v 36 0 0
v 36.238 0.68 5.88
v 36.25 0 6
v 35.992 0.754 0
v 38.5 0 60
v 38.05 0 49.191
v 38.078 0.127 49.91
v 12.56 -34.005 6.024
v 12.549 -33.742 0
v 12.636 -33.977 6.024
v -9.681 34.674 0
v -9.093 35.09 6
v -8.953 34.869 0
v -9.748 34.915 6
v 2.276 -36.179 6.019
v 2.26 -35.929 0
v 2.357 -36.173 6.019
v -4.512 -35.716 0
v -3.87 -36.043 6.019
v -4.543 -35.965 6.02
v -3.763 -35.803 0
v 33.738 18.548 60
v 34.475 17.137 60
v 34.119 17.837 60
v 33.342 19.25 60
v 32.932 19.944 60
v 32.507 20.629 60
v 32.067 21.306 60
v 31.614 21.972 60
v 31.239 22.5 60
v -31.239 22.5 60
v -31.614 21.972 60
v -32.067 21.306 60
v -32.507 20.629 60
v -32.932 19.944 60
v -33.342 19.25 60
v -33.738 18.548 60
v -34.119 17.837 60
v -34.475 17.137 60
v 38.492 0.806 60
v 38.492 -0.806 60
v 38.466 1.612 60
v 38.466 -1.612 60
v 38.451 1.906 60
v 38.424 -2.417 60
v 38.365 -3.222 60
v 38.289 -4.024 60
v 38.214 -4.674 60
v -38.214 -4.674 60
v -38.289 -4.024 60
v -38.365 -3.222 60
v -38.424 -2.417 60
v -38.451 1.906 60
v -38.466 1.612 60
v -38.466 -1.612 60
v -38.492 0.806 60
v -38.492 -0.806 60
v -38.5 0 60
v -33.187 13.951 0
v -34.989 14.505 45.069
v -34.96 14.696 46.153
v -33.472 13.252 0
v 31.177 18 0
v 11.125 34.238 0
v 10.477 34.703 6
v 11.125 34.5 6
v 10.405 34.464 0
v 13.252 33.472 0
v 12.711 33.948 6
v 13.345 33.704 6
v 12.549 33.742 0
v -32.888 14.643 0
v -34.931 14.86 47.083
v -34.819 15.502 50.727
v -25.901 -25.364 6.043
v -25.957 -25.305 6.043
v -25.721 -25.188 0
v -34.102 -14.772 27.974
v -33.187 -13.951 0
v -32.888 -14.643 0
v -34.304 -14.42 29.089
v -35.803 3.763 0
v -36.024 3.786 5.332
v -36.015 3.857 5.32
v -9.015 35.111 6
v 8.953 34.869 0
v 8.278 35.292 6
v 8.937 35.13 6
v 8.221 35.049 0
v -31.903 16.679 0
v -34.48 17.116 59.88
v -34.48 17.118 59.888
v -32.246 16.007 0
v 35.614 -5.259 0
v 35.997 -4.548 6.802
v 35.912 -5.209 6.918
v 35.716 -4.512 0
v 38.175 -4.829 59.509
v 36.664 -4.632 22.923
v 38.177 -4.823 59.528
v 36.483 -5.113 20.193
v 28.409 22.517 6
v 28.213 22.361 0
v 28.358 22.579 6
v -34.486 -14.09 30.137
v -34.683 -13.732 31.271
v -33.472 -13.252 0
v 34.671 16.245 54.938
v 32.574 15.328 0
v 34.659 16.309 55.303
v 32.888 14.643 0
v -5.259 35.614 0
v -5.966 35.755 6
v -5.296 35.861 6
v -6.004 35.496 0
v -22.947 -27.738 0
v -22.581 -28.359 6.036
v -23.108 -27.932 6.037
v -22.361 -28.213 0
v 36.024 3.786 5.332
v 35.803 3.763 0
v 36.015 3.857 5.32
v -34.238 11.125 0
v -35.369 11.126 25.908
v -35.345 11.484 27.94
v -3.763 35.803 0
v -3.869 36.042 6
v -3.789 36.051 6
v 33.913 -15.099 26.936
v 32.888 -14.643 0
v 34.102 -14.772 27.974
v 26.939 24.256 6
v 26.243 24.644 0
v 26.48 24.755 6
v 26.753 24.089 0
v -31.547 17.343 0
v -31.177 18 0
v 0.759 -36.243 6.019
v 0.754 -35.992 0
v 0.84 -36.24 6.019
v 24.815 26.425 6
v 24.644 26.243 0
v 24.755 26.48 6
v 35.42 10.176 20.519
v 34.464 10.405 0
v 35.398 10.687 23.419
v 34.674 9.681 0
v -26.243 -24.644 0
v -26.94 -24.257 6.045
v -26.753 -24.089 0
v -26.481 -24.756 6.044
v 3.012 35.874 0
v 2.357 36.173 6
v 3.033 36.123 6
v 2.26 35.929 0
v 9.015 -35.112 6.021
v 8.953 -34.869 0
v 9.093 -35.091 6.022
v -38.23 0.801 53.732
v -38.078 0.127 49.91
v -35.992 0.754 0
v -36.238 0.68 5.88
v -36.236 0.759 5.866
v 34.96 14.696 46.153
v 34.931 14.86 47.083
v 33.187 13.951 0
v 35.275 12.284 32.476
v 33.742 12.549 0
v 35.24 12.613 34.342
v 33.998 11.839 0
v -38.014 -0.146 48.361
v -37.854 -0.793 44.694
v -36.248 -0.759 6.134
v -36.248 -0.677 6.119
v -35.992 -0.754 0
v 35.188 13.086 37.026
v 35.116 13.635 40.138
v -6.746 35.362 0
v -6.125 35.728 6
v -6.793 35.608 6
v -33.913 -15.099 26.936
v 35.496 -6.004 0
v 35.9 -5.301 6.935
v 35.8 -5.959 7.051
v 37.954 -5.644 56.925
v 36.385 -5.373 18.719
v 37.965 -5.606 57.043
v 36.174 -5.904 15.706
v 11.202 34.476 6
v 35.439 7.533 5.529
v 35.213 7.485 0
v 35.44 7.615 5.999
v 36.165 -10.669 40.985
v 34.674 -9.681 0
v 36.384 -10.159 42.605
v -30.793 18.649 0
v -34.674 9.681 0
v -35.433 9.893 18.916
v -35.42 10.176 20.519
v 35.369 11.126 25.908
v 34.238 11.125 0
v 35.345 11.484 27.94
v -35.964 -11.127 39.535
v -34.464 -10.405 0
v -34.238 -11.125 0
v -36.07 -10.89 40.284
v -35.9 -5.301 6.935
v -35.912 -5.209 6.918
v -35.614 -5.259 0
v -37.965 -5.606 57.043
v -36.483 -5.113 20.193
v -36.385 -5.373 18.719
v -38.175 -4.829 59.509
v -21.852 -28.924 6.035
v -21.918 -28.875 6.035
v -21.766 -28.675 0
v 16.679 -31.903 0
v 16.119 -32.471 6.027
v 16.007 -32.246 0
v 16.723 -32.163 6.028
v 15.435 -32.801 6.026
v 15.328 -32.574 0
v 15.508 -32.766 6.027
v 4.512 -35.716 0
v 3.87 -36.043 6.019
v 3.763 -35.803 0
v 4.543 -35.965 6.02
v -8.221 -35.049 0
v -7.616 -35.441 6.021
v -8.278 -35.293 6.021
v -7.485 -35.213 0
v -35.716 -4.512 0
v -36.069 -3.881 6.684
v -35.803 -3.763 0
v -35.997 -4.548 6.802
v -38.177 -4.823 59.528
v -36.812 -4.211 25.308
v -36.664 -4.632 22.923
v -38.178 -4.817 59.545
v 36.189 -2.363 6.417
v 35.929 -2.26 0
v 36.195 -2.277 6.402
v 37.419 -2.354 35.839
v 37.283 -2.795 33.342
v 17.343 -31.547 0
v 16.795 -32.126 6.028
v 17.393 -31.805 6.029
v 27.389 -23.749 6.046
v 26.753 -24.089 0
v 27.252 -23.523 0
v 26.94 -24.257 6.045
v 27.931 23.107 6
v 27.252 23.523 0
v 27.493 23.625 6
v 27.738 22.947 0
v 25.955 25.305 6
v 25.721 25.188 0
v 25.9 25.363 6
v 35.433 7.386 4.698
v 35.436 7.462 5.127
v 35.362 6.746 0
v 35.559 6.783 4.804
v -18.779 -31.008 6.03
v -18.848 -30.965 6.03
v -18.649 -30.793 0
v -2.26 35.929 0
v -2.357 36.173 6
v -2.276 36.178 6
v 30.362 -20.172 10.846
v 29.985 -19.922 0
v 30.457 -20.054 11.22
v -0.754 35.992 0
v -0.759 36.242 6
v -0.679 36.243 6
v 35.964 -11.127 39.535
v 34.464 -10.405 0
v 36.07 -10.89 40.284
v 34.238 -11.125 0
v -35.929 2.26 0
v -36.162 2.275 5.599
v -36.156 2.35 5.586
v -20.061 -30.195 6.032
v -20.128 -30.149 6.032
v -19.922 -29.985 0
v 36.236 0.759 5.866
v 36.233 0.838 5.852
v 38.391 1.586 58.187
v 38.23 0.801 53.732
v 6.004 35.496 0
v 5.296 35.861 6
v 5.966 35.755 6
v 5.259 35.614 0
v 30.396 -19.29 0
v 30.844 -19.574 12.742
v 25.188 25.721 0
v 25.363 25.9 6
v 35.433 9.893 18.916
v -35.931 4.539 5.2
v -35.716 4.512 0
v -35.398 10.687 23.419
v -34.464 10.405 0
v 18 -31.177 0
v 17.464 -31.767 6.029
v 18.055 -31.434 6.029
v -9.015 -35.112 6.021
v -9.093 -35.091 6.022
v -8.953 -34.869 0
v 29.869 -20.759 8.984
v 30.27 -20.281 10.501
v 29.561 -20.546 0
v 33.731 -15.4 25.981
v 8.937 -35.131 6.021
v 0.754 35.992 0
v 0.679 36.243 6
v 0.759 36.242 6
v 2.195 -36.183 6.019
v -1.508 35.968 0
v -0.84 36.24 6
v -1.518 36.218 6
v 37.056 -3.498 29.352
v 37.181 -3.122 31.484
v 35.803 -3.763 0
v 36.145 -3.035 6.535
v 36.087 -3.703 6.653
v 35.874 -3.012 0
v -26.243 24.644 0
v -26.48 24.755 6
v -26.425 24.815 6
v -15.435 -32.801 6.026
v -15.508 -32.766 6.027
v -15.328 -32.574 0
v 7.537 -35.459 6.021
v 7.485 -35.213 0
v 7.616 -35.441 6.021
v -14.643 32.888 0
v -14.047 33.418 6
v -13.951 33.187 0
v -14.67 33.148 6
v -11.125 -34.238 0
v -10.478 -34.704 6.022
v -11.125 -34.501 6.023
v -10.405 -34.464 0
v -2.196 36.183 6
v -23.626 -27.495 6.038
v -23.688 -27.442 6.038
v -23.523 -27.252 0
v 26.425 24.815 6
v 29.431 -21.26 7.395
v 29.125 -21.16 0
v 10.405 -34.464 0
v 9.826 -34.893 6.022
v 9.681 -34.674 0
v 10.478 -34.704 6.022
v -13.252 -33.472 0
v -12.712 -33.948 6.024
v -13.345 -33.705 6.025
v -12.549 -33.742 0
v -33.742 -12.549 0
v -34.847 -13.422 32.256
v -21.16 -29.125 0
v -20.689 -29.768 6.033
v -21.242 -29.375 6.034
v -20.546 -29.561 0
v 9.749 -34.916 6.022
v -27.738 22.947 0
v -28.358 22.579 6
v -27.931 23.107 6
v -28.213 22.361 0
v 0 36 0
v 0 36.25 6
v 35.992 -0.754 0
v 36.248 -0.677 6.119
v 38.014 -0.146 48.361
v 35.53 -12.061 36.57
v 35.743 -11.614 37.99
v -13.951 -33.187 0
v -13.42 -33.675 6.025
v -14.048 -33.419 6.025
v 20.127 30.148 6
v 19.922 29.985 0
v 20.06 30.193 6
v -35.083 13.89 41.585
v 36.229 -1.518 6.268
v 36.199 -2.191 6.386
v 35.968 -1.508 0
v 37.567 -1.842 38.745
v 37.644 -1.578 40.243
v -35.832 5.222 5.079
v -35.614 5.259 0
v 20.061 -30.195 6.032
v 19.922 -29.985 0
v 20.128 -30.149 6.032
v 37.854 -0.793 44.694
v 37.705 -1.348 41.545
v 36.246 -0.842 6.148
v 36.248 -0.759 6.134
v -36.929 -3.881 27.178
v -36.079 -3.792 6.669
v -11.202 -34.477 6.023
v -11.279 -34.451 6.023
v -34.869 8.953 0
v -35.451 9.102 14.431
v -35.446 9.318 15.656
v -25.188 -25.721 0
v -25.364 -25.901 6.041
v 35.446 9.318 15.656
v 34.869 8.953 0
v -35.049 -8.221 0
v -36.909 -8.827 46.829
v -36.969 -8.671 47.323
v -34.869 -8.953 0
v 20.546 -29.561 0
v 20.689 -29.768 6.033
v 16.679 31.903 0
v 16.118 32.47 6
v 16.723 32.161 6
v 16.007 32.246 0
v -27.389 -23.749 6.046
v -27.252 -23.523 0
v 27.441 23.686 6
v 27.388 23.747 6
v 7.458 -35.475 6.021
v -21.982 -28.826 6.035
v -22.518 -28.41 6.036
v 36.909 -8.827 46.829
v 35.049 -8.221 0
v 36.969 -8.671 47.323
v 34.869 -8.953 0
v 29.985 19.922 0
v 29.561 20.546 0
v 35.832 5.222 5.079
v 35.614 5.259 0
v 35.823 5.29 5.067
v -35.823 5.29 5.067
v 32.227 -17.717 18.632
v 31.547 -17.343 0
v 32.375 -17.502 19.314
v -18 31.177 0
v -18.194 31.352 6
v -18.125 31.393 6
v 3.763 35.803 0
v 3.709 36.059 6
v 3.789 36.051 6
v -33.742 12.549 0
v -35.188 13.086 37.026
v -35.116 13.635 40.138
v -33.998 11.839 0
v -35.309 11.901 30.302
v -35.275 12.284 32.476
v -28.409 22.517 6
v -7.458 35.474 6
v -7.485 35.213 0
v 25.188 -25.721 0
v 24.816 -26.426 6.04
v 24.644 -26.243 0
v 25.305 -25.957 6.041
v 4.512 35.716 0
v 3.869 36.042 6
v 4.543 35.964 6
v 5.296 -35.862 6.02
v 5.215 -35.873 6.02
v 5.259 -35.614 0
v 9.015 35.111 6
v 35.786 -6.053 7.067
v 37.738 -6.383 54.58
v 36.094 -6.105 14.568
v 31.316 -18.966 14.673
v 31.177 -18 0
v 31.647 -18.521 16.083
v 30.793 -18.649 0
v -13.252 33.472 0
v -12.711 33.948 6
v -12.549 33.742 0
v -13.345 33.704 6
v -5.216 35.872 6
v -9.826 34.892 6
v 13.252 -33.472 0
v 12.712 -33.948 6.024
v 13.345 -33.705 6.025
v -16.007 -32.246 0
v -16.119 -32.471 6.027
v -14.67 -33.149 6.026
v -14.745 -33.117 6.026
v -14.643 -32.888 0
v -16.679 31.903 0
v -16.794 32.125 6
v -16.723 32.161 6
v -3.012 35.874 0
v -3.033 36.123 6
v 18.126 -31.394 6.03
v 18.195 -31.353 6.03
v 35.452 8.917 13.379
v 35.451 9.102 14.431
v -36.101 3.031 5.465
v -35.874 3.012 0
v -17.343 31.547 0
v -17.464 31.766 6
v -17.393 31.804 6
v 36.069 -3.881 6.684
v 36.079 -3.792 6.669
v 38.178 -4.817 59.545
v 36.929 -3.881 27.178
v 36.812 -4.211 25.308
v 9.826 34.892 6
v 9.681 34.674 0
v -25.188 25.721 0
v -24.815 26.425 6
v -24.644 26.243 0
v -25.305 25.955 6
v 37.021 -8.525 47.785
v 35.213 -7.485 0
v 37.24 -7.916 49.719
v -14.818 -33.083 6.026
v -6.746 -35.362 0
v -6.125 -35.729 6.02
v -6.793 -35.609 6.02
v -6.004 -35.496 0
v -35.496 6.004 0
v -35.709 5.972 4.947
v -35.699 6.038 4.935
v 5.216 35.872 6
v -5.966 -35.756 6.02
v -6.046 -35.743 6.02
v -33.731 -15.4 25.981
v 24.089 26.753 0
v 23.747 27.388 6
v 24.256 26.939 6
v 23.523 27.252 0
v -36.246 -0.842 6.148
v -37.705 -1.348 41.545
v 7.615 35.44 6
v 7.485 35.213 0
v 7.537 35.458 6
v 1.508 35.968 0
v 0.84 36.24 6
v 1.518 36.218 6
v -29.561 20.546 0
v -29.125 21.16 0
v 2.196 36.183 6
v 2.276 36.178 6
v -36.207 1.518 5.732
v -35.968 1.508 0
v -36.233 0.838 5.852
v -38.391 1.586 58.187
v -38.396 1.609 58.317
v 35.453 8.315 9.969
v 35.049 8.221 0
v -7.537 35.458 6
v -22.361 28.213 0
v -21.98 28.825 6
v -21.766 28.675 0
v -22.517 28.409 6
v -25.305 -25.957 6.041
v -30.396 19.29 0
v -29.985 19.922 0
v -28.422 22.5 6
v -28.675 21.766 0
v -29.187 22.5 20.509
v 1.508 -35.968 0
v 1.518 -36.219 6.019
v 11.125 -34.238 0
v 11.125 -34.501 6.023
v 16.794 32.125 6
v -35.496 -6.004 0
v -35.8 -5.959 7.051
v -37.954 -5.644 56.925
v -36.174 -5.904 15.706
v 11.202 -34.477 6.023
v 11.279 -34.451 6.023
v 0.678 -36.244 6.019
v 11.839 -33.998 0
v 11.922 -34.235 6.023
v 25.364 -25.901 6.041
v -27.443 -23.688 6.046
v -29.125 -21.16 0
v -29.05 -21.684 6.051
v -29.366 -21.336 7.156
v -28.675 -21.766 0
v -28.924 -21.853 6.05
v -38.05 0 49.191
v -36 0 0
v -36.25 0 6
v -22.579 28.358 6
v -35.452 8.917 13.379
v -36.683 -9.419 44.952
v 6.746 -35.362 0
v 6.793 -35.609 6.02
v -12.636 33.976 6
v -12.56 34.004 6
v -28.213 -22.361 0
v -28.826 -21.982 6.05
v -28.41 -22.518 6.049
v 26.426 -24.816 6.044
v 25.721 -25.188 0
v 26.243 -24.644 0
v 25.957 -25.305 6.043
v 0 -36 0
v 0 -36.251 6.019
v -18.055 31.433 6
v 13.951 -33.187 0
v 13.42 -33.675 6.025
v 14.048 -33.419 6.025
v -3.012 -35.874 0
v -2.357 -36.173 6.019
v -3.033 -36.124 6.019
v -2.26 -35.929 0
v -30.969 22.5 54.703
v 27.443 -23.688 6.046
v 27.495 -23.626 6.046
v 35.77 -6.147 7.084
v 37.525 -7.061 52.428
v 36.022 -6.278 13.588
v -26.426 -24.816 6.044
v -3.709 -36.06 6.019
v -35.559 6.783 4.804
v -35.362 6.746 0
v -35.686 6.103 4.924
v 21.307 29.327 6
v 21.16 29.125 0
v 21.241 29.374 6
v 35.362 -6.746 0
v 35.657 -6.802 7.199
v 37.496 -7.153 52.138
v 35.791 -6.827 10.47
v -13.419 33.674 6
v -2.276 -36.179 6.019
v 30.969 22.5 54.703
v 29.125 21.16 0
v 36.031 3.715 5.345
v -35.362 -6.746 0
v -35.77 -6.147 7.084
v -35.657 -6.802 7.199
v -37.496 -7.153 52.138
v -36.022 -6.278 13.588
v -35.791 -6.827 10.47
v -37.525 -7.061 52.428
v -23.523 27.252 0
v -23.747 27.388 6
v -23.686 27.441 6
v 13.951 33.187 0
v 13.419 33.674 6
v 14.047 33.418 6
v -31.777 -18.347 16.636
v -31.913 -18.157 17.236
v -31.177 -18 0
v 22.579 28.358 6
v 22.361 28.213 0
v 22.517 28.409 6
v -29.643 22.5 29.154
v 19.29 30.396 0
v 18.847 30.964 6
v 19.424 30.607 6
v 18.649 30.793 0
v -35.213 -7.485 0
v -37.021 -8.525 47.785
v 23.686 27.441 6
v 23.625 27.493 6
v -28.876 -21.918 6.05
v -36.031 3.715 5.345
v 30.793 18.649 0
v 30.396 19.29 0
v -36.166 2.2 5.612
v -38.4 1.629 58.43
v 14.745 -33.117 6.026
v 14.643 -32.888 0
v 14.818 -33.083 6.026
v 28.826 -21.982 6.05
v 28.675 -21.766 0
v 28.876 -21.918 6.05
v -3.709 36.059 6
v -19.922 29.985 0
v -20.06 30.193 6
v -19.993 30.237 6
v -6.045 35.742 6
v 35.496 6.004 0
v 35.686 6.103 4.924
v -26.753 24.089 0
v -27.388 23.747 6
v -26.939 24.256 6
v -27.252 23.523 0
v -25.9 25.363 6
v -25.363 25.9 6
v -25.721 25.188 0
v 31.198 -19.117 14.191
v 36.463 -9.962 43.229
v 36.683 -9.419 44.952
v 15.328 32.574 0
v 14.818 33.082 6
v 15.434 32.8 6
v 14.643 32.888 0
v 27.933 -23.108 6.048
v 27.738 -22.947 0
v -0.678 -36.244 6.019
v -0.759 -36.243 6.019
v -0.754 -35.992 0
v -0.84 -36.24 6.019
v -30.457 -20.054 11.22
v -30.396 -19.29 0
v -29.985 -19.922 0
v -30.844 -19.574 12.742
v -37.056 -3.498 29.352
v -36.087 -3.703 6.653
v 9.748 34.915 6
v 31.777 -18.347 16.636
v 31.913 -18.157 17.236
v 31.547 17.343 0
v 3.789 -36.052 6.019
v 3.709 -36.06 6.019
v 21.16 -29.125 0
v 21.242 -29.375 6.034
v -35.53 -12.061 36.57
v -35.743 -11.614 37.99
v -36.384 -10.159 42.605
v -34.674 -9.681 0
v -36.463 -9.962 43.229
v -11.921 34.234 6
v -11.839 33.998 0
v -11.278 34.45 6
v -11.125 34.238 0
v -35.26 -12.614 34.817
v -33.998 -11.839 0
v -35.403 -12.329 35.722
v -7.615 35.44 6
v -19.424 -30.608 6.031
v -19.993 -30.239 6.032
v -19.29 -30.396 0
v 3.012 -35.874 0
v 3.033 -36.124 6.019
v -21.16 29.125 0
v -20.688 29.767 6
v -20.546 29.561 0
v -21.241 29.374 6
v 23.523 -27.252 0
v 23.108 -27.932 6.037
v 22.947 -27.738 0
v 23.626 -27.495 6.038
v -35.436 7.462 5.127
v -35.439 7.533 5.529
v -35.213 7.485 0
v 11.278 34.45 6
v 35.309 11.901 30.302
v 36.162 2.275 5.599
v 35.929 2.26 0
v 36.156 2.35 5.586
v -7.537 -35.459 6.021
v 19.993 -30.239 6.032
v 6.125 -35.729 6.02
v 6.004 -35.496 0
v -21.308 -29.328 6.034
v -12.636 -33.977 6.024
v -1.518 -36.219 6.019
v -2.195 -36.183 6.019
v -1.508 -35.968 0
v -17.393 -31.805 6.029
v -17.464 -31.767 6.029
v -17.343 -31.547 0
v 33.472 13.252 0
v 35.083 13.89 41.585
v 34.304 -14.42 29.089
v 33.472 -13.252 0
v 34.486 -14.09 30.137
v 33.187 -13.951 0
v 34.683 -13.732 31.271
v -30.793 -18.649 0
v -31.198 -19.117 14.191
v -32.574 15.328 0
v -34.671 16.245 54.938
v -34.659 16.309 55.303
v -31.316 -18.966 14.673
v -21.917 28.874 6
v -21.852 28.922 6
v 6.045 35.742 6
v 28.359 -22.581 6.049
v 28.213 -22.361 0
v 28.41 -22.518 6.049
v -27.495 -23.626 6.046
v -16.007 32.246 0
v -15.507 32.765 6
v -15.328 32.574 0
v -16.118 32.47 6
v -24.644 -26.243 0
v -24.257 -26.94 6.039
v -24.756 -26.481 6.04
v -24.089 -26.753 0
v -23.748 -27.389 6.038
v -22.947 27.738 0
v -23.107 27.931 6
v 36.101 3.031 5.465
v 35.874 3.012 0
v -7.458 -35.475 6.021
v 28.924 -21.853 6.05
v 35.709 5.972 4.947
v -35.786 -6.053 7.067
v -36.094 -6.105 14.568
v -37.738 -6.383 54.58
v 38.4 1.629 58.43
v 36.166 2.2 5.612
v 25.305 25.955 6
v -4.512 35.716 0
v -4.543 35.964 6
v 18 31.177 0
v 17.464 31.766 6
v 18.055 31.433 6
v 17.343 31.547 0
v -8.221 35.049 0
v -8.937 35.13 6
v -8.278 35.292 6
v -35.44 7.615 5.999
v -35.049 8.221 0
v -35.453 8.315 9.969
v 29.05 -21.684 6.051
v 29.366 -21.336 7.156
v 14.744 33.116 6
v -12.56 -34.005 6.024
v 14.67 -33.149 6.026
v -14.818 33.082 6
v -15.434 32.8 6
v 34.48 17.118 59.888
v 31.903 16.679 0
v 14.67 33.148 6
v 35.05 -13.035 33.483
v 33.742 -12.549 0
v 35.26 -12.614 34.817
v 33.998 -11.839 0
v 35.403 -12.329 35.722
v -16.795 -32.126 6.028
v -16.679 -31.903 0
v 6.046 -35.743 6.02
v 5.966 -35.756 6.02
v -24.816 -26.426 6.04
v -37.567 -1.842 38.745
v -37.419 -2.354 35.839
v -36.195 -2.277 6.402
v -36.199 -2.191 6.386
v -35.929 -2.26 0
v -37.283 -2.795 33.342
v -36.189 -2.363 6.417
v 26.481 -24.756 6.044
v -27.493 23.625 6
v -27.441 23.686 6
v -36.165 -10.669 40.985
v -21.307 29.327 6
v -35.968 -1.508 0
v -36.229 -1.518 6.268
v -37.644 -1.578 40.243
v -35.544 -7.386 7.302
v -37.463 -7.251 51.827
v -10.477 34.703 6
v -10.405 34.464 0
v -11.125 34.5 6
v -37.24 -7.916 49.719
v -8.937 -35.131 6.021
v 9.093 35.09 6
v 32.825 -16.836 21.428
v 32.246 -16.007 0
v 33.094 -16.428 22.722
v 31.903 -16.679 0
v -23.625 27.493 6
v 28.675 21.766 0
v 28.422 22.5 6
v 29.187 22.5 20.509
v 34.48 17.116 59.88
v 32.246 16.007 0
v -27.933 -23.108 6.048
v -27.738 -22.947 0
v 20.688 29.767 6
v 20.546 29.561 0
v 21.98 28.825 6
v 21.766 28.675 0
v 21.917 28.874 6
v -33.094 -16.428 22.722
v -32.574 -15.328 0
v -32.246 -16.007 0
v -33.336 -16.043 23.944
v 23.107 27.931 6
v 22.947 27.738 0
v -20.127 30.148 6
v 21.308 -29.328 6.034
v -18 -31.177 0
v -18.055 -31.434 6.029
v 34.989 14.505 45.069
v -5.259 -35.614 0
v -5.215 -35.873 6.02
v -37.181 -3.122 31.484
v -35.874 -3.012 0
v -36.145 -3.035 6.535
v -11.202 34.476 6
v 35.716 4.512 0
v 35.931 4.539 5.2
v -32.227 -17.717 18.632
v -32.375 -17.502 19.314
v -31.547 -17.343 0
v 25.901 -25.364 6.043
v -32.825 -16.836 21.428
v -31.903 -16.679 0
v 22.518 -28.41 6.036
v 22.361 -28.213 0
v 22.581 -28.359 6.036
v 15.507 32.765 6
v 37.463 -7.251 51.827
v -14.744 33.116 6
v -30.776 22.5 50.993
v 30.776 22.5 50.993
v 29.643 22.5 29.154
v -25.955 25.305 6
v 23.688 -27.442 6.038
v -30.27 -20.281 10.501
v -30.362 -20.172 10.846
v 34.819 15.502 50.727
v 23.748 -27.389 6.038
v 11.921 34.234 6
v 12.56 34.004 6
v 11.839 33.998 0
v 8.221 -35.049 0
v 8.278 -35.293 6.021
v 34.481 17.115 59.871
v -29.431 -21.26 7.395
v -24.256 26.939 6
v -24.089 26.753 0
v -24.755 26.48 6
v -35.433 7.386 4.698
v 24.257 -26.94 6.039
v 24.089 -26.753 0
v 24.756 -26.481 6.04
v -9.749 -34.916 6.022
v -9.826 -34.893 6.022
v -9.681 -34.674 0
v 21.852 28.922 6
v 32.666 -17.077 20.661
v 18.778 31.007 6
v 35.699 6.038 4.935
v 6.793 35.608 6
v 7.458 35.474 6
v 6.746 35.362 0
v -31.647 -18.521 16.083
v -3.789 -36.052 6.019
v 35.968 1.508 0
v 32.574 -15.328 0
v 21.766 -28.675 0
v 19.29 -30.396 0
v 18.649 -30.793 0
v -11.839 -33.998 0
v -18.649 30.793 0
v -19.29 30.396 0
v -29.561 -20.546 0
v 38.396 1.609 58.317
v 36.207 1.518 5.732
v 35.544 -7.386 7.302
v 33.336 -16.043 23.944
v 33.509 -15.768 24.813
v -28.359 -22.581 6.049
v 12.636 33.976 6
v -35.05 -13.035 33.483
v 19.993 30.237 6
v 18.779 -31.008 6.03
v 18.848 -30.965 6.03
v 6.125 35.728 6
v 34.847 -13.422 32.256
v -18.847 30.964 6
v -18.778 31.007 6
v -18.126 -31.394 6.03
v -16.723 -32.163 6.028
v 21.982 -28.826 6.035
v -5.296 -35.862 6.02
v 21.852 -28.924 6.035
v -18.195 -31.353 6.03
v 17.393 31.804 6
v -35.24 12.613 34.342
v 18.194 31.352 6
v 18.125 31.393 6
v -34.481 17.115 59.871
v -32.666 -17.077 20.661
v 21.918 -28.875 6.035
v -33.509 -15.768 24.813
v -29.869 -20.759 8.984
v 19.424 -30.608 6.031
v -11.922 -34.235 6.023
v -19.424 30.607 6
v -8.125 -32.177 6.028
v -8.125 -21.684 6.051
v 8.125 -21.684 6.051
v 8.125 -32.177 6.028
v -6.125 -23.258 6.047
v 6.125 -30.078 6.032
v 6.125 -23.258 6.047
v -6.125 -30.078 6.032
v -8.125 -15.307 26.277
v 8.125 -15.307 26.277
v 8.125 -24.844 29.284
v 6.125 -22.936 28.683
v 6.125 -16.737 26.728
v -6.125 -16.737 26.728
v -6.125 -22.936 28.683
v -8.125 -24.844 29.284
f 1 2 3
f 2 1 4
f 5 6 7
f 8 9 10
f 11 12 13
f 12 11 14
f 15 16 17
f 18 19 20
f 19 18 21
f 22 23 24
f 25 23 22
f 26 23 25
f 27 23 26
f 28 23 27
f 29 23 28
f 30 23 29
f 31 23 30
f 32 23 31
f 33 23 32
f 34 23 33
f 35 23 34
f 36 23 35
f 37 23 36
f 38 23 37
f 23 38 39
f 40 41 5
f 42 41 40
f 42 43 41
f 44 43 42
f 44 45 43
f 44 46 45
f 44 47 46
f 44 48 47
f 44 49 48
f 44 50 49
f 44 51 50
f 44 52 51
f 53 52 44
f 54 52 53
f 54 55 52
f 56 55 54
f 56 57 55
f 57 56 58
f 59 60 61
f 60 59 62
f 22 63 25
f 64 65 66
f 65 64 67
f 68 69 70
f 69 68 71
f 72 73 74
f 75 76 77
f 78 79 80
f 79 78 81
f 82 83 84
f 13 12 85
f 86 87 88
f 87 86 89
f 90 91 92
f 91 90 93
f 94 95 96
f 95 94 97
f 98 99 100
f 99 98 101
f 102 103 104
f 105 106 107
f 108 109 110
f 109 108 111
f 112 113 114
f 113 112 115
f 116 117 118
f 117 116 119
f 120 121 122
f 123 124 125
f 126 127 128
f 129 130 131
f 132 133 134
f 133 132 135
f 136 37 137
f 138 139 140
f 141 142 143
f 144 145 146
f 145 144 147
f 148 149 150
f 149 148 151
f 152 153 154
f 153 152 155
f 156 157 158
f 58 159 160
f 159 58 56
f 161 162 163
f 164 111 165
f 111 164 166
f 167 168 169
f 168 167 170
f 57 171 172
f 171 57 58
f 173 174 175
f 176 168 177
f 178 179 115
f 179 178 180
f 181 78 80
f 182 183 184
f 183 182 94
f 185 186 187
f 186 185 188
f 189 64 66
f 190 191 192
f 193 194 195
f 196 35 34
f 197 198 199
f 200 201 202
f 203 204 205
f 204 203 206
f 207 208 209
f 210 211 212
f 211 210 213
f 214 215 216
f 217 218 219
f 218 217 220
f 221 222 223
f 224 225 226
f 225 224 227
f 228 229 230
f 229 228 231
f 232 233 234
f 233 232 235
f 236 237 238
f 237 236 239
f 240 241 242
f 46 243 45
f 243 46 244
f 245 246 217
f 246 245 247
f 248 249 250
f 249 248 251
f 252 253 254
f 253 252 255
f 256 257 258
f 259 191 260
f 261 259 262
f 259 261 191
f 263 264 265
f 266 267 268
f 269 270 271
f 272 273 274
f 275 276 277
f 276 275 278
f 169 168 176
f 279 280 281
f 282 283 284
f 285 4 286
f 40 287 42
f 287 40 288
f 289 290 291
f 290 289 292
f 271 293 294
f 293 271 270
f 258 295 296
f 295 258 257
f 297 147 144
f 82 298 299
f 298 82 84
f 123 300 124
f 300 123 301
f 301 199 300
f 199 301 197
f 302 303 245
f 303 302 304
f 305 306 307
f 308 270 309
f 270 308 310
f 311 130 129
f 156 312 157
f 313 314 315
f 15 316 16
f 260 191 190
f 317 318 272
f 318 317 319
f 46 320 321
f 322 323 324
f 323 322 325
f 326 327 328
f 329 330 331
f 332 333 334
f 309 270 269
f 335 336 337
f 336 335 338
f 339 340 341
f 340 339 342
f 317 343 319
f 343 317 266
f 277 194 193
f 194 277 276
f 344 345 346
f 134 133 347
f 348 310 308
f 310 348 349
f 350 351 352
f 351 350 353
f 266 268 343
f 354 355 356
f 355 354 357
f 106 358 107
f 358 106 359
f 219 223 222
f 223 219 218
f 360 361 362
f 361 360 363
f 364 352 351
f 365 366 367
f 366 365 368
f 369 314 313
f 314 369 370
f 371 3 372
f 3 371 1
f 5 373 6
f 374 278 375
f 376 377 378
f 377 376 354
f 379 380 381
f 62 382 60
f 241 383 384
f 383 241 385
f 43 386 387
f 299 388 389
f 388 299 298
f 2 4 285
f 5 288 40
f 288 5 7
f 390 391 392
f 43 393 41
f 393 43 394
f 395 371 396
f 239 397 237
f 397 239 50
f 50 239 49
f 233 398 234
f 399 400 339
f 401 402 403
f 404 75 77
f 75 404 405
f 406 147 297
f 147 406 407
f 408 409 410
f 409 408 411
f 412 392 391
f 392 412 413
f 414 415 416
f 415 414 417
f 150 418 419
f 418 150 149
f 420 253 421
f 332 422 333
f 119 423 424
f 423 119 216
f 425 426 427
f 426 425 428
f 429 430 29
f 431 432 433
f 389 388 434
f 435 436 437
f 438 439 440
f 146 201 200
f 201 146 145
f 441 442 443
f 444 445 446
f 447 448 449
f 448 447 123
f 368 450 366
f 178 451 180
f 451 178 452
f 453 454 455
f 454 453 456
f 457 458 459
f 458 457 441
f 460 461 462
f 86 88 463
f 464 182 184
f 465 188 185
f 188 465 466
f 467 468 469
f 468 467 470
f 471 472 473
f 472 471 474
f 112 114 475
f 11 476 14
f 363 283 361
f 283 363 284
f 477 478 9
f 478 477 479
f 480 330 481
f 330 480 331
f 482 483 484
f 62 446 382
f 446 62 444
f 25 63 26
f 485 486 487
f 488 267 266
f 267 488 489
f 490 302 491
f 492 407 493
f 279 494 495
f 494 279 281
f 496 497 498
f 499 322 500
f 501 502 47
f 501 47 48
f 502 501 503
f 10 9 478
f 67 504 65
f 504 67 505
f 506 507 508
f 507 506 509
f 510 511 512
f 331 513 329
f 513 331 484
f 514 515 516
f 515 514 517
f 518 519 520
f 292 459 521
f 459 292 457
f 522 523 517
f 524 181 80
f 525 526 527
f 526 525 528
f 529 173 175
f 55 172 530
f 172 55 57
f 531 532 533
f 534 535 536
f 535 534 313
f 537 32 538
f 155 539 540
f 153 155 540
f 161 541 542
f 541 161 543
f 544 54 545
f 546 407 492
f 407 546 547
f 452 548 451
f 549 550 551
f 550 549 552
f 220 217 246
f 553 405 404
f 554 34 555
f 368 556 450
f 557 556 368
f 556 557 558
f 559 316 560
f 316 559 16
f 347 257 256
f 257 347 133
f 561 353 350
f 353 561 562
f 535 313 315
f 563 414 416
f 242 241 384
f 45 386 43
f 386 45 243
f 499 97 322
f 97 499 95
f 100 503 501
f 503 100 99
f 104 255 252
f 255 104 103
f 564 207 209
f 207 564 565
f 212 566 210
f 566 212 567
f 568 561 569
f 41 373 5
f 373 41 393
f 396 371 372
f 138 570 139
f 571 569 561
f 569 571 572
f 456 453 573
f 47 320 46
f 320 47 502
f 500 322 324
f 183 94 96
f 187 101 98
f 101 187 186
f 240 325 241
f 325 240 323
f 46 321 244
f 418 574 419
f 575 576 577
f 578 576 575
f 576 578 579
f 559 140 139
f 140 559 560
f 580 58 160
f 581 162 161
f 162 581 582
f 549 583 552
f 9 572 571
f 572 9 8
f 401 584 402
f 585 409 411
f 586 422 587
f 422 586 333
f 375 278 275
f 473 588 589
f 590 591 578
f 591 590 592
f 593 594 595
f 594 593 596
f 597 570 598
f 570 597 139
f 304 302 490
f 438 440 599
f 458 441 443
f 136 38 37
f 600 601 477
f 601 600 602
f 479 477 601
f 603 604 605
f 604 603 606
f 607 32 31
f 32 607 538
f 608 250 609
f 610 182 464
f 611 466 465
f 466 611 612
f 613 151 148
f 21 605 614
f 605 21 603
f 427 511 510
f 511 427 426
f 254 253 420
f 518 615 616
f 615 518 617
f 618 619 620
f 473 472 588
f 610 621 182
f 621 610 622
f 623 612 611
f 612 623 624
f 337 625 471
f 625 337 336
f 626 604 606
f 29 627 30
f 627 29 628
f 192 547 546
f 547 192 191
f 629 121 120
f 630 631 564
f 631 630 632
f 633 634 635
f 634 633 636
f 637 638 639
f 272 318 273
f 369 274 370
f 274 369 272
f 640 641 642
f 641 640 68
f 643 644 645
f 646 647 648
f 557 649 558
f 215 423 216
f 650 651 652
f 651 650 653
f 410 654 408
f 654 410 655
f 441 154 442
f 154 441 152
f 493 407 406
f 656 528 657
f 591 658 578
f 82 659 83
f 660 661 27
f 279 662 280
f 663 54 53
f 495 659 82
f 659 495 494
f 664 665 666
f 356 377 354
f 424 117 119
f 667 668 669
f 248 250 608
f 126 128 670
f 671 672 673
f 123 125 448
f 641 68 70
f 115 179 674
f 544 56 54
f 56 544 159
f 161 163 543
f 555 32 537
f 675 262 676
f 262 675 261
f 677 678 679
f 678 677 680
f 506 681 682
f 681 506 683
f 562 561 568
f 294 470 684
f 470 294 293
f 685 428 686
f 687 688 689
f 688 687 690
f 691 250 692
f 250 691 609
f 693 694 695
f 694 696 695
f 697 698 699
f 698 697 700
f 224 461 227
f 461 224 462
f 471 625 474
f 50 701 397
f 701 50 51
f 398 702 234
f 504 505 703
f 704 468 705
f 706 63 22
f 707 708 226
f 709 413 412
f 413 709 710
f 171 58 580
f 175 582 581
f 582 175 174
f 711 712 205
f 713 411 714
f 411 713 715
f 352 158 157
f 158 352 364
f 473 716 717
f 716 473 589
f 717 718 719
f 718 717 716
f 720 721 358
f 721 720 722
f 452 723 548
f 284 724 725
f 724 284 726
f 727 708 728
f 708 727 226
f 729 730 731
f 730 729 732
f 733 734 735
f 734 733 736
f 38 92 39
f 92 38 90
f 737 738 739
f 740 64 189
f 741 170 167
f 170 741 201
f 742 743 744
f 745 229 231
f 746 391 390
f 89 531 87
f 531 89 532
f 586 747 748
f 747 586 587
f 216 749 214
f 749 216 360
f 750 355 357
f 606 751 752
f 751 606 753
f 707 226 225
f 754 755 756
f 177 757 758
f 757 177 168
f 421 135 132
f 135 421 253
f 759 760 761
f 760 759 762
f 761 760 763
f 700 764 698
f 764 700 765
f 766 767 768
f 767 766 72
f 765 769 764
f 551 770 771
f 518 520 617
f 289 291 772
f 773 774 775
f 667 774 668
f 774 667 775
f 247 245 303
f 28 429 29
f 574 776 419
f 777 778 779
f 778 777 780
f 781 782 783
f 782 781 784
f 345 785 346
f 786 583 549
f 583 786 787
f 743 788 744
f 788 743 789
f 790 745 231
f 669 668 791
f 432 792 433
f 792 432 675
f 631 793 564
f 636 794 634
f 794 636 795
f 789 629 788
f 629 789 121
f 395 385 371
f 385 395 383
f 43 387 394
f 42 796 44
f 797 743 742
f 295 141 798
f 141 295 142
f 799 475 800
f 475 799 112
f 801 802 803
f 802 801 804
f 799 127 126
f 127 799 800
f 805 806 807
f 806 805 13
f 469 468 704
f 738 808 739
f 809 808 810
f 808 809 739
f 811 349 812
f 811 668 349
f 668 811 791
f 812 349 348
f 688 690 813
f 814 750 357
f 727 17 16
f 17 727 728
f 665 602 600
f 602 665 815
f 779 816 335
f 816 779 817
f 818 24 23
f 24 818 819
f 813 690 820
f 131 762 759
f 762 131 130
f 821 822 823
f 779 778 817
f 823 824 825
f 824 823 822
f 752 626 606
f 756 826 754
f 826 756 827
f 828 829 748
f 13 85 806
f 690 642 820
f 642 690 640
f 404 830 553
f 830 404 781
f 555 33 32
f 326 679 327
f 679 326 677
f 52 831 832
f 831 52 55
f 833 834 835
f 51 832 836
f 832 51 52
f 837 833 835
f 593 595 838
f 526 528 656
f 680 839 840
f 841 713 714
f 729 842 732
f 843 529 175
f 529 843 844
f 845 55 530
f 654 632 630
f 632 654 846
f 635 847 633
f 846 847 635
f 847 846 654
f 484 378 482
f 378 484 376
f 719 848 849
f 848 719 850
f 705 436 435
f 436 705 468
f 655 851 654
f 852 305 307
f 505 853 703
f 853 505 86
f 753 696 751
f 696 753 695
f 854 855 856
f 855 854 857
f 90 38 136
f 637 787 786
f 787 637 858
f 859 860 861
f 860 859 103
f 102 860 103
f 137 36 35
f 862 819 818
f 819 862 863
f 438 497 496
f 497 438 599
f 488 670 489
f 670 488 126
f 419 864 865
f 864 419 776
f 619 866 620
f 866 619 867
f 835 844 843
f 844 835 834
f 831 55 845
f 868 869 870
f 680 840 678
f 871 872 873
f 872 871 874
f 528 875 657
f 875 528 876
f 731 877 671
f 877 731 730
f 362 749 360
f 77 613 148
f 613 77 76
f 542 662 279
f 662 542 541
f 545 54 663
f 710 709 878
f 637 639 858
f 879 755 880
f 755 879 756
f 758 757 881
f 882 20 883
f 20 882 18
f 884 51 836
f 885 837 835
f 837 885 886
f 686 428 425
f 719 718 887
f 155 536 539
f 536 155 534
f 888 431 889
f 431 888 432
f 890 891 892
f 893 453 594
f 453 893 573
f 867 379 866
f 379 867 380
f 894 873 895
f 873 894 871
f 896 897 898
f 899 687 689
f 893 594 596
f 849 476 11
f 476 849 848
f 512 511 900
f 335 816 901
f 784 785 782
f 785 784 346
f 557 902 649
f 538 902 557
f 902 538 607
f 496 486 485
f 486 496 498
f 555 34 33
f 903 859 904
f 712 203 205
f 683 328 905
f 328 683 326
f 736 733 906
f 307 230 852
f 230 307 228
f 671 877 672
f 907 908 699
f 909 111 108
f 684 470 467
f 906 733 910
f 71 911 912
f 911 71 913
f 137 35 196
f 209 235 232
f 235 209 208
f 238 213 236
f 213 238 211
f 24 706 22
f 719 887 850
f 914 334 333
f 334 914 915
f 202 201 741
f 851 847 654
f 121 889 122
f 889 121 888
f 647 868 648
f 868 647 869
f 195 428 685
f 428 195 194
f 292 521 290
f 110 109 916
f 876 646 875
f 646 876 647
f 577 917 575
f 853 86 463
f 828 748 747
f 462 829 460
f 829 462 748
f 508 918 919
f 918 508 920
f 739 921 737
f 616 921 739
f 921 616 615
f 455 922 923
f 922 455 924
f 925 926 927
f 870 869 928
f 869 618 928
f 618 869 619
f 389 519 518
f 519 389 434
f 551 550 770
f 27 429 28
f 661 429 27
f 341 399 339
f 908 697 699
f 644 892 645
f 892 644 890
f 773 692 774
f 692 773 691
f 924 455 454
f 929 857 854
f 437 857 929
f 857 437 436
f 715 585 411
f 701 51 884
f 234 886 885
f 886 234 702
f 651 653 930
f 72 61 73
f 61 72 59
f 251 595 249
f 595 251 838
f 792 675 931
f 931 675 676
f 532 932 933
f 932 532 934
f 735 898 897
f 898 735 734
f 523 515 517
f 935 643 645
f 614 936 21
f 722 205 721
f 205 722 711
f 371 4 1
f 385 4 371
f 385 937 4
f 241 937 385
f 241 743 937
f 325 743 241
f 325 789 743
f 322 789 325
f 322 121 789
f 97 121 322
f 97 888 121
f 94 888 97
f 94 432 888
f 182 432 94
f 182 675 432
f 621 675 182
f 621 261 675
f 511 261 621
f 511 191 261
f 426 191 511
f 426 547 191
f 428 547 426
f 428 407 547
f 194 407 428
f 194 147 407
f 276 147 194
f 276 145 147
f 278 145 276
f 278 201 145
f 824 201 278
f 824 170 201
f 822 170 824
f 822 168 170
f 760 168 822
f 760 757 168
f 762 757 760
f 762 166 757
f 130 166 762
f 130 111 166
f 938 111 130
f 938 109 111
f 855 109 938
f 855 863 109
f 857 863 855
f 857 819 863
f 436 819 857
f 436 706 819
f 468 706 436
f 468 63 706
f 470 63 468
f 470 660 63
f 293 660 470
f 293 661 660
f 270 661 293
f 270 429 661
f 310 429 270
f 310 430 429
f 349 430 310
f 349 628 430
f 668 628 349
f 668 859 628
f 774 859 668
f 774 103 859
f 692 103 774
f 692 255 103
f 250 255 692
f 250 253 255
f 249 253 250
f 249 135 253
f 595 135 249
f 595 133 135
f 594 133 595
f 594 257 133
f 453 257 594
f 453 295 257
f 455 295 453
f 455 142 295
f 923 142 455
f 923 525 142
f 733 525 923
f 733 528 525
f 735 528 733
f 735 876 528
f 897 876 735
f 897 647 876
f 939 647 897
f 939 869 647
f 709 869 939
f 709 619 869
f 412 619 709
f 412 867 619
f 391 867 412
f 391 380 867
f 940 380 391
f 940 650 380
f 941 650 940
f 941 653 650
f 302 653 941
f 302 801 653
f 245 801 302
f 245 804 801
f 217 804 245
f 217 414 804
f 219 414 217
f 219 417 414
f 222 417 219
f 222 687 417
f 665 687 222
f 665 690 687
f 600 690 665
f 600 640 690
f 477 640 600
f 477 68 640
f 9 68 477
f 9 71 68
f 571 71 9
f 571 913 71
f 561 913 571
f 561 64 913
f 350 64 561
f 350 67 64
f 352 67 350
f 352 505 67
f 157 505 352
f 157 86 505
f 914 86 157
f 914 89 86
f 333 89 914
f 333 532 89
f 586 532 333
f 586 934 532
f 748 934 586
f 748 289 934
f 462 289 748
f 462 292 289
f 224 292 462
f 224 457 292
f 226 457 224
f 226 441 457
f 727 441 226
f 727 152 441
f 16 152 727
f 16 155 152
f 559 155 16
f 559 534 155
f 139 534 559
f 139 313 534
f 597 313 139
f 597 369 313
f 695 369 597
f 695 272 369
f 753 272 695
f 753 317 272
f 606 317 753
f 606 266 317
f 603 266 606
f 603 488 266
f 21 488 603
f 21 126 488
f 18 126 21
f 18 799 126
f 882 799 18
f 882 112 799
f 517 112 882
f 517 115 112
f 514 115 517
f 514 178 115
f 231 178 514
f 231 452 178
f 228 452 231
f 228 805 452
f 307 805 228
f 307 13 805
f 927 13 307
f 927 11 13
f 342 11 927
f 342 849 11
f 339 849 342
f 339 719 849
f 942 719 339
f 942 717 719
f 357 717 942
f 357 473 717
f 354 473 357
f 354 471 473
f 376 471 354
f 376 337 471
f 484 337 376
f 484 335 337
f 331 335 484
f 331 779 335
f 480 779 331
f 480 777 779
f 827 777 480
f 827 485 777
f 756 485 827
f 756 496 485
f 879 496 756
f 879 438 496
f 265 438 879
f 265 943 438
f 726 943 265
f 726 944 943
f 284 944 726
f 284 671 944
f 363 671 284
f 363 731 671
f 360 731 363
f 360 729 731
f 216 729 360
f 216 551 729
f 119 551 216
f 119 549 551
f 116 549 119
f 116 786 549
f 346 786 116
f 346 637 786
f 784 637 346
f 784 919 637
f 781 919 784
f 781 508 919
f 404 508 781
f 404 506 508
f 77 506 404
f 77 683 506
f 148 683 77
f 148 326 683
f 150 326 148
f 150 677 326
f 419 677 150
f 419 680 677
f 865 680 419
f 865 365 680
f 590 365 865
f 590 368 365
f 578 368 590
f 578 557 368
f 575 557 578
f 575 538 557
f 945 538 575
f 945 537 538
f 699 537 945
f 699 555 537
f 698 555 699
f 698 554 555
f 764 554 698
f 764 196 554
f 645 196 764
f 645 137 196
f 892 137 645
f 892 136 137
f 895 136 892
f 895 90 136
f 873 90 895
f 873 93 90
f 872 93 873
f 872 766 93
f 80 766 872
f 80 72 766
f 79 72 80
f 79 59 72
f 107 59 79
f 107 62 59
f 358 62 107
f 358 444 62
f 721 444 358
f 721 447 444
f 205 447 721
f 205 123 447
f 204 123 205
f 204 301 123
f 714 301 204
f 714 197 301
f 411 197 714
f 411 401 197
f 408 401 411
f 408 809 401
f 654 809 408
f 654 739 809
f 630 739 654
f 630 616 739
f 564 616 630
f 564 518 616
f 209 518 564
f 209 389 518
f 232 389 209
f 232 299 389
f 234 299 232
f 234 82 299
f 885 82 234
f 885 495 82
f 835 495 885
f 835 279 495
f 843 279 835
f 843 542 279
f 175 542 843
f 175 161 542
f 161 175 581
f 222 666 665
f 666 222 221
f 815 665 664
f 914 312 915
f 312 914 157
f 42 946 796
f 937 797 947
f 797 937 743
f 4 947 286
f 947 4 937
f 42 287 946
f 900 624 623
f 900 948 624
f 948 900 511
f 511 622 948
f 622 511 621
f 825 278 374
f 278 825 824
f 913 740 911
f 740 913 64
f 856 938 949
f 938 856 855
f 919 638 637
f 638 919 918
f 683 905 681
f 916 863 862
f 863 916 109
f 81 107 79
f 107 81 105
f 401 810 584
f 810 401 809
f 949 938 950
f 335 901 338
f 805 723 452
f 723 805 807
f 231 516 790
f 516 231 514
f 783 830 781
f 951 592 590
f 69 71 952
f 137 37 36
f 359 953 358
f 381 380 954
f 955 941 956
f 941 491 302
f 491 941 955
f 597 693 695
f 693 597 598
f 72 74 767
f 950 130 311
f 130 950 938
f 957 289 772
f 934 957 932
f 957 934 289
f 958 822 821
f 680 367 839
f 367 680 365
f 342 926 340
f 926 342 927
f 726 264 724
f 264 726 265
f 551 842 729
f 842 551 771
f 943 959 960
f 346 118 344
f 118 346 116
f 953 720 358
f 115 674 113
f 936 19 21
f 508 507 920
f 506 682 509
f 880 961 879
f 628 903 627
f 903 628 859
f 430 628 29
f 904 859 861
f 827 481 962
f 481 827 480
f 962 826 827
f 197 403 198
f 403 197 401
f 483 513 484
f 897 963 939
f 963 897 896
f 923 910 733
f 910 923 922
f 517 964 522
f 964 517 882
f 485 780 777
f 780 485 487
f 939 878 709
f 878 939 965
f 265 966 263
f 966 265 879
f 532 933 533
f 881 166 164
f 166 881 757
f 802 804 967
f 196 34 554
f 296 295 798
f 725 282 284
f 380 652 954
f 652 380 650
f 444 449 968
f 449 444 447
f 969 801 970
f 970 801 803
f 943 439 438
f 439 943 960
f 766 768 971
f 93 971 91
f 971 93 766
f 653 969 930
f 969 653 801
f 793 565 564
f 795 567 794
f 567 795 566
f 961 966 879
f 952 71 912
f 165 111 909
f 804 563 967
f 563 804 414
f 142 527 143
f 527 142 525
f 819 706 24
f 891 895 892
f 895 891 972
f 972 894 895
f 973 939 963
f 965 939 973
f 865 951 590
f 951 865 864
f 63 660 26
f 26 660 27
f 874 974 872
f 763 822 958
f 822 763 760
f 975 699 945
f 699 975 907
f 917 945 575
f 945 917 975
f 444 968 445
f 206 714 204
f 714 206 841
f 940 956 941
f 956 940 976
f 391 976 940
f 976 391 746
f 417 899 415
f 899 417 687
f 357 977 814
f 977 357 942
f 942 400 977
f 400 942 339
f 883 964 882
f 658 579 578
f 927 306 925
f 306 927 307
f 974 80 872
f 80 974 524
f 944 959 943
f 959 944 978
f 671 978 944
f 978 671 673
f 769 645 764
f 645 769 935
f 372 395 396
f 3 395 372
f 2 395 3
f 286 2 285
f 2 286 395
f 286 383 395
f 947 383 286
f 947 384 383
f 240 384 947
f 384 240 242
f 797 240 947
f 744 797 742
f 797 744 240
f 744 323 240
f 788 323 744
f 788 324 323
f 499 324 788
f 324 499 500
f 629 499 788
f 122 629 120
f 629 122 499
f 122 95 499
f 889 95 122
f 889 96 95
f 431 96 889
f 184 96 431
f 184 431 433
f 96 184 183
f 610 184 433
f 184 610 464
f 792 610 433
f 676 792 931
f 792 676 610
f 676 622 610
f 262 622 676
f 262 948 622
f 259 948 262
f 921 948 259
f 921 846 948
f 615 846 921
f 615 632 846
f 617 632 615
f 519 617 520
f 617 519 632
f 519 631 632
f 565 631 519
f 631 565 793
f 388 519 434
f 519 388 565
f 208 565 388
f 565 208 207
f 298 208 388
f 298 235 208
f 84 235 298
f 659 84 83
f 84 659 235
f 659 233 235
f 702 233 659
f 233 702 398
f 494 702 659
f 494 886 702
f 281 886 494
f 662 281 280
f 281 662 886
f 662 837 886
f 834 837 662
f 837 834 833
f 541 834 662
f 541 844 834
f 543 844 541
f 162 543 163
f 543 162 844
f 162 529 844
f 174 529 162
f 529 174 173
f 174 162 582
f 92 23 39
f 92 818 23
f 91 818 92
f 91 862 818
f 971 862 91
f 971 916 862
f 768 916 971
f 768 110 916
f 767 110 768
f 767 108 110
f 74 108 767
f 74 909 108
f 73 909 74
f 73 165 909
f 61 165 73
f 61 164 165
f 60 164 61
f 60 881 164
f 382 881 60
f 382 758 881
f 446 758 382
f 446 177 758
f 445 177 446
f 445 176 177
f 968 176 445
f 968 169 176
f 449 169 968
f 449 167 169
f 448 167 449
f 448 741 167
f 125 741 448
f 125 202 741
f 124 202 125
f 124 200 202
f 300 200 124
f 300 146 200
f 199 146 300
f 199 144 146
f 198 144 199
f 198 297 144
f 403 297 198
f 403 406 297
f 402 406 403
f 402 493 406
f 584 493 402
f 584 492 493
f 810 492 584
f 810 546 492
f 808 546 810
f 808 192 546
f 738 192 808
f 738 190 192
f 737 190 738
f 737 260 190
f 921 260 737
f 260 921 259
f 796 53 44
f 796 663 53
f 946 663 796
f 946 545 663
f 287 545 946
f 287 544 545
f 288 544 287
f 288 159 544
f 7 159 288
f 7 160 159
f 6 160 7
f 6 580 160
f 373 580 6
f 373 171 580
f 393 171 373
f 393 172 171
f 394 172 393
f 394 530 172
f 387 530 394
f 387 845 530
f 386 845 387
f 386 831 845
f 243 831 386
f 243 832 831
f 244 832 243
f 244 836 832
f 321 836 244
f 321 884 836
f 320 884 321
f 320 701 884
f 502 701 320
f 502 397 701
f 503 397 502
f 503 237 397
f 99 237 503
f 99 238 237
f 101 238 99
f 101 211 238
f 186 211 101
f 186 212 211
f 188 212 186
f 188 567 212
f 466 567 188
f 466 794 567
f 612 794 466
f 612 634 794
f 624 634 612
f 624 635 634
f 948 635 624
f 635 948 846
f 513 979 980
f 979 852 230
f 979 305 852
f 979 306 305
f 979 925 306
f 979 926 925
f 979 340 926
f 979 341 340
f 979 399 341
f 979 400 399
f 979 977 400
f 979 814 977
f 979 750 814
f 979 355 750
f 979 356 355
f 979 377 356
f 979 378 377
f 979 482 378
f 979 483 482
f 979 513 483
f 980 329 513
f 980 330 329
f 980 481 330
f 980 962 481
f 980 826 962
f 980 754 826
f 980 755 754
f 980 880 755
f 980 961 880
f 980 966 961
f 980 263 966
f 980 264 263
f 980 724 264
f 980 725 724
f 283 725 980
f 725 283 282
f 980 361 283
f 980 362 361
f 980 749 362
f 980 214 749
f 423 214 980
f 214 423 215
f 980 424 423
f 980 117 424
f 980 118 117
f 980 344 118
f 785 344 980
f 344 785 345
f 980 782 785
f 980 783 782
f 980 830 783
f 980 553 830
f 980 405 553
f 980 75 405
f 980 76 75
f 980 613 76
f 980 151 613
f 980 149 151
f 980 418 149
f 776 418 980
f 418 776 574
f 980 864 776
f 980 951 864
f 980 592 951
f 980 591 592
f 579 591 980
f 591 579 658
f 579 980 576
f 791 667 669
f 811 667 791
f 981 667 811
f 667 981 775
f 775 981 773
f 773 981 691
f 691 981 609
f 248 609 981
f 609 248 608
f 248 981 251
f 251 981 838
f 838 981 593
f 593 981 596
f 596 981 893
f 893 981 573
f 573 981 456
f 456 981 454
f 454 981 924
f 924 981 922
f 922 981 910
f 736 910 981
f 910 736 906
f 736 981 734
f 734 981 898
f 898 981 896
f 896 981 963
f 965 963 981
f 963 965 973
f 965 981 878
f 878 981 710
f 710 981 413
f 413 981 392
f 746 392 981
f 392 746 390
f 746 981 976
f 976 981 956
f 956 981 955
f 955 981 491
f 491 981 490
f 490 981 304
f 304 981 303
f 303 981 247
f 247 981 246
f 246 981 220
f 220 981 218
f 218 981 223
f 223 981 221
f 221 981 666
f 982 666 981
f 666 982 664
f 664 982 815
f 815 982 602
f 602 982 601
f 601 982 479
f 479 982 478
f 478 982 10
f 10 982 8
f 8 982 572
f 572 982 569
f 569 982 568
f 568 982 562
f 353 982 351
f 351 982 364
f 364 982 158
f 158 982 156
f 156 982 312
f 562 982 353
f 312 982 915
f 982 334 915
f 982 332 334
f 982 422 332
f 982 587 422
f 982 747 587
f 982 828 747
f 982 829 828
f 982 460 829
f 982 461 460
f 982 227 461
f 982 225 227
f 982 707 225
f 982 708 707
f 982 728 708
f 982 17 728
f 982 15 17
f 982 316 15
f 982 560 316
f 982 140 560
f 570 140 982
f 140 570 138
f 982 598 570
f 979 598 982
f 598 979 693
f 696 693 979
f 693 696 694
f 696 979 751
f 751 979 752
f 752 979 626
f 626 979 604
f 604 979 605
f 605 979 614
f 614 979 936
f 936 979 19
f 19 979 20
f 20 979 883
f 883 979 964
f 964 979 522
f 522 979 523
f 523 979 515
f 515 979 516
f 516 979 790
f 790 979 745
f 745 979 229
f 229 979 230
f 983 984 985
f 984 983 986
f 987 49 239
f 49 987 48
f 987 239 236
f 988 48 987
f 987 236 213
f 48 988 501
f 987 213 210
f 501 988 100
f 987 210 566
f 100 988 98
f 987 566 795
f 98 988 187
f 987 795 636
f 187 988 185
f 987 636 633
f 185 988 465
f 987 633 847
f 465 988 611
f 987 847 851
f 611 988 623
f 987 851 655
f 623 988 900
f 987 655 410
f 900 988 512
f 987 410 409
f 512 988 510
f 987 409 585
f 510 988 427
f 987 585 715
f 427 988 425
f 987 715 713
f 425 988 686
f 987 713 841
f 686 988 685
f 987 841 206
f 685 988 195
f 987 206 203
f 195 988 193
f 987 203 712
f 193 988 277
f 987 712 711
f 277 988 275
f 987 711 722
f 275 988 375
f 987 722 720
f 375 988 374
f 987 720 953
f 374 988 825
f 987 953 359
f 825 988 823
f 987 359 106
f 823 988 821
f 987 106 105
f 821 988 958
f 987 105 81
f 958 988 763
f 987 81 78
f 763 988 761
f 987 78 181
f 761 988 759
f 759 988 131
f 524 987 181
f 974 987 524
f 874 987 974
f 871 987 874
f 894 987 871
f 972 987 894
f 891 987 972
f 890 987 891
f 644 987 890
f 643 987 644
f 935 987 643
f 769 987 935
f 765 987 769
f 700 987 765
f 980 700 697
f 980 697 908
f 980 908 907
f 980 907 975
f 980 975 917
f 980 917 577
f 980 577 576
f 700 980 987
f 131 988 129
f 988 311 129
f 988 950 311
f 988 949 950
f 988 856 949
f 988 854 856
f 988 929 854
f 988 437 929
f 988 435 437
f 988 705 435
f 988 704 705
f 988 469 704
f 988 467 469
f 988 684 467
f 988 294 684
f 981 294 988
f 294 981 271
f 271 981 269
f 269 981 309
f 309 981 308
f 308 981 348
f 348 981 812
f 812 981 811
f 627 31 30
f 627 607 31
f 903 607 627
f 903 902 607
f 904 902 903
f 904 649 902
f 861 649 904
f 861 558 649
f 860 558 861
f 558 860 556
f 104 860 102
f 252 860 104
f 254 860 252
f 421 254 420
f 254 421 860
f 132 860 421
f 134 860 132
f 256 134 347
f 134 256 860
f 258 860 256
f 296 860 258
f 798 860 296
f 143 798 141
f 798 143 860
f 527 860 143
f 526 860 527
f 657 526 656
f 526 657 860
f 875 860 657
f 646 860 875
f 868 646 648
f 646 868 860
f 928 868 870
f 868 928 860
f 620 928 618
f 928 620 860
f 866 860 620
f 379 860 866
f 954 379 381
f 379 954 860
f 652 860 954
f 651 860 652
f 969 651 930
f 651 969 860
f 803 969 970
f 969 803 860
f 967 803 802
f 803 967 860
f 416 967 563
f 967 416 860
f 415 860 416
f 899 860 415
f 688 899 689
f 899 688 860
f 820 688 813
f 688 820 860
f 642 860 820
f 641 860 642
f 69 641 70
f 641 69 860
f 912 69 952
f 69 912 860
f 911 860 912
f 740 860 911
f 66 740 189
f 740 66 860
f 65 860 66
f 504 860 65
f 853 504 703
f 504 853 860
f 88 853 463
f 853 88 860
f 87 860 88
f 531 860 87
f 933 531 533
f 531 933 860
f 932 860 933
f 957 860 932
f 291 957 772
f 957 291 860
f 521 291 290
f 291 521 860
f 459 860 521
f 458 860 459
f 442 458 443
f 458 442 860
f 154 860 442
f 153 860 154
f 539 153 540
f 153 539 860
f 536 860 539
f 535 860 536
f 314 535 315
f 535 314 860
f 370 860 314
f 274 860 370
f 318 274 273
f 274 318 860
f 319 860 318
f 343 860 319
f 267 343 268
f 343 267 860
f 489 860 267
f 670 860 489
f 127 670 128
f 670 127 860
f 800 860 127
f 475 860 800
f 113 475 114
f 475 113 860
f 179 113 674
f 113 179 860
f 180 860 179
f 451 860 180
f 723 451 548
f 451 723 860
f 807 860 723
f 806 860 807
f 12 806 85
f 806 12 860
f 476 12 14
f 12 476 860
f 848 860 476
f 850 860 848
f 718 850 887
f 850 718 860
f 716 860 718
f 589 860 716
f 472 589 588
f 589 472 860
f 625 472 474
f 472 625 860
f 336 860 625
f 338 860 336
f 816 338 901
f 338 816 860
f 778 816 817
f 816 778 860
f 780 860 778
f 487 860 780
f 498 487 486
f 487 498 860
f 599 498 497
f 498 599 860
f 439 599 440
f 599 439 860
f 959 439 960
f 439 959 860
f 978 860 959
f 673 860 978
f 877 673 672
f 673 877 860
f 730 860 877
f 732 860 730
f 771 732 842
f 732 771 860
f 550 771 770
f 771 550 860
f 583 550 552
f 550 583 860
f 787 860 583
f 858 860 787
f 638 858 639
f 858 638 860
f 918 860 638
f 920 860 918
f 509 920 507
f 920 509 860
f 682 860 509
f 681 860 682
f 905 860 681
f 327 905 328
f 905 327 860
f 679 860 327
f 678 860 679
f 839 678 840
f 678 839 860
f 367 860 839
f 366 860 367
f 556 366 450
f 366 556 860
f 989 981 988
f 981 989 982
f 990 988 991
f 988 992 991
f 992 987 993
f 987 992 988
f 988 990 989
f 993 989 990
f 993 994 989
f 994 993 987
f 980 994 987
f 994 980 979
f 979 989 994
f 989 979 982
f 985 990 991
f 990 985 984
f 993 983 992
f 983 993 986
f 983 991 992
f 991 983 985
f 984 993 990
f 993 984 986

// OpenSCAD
/* [Cup holder] */

// Holder height
cupHeight = 60;  // [25:70]
// Lower diameter
cupLowerDiameter = 72; // [60:0.5:80]
// Upper diameter
cupUpperDiameter = 77; // [60:0.5:80]

/* [USB slot] */

// USB connector rest
usbSlot = 1;  // [1:Present, 0:Absent]
// Hole width
usbWidth = 12.25; // [8:0.25:20]
// Hole depth
usbDepth = 6.5; // [5:0.25:9]
// Hole height
usbHeight = 25; // [10:50]

module slot() {
    rotate([-10, 0, 0]) translate([-41, -7.5, 0]) cube([82, 15, 155]);
}

module cup() {
    cylinder(cupHeight, cupLowerDiameter/2, cupUpperDiameter/2, $fn=300);
}

module test() {
    difference() {
        cup();
        translate([0, 0, 2]) scale([0.95, 0.95, 1]) cup();
    }
}

module holder() {
    union() {
        difference() {
            cup();
            scale([1.1, 1, 1]) translate([0, 0, 6]) slot();
            hull() {
                rotate([-17.5, 0, 0]) translate([-50, -37.5, -0.75]) cube([100, 15, 75]);
                translate([-50, -60, 6]) cube([100, 15, 75]);
            }
            hull() {
                translate([-50, 22.5, 6]) cube([100, 15, 75]);
                translate([-50, 60, 6]) cube([100, 15, 75]);
            }
        }
        if (usbSlot) {
            rotate([-17.5, 0, 0]) difference() {
                translate([-((usbWidth/2)+2), -(26+usbDepth), -4-(usbDepth/12)]) cube([usbWidth+4, usbDepth+4, usbHeight]);
                translate([-(usbWidth/2), -(24+usbDepth), -4-(usbDepth/12)]) cube([usbWidth, usbDepth, usbHeight+1]);
            }
        }
    }
}

//test();
holder();
